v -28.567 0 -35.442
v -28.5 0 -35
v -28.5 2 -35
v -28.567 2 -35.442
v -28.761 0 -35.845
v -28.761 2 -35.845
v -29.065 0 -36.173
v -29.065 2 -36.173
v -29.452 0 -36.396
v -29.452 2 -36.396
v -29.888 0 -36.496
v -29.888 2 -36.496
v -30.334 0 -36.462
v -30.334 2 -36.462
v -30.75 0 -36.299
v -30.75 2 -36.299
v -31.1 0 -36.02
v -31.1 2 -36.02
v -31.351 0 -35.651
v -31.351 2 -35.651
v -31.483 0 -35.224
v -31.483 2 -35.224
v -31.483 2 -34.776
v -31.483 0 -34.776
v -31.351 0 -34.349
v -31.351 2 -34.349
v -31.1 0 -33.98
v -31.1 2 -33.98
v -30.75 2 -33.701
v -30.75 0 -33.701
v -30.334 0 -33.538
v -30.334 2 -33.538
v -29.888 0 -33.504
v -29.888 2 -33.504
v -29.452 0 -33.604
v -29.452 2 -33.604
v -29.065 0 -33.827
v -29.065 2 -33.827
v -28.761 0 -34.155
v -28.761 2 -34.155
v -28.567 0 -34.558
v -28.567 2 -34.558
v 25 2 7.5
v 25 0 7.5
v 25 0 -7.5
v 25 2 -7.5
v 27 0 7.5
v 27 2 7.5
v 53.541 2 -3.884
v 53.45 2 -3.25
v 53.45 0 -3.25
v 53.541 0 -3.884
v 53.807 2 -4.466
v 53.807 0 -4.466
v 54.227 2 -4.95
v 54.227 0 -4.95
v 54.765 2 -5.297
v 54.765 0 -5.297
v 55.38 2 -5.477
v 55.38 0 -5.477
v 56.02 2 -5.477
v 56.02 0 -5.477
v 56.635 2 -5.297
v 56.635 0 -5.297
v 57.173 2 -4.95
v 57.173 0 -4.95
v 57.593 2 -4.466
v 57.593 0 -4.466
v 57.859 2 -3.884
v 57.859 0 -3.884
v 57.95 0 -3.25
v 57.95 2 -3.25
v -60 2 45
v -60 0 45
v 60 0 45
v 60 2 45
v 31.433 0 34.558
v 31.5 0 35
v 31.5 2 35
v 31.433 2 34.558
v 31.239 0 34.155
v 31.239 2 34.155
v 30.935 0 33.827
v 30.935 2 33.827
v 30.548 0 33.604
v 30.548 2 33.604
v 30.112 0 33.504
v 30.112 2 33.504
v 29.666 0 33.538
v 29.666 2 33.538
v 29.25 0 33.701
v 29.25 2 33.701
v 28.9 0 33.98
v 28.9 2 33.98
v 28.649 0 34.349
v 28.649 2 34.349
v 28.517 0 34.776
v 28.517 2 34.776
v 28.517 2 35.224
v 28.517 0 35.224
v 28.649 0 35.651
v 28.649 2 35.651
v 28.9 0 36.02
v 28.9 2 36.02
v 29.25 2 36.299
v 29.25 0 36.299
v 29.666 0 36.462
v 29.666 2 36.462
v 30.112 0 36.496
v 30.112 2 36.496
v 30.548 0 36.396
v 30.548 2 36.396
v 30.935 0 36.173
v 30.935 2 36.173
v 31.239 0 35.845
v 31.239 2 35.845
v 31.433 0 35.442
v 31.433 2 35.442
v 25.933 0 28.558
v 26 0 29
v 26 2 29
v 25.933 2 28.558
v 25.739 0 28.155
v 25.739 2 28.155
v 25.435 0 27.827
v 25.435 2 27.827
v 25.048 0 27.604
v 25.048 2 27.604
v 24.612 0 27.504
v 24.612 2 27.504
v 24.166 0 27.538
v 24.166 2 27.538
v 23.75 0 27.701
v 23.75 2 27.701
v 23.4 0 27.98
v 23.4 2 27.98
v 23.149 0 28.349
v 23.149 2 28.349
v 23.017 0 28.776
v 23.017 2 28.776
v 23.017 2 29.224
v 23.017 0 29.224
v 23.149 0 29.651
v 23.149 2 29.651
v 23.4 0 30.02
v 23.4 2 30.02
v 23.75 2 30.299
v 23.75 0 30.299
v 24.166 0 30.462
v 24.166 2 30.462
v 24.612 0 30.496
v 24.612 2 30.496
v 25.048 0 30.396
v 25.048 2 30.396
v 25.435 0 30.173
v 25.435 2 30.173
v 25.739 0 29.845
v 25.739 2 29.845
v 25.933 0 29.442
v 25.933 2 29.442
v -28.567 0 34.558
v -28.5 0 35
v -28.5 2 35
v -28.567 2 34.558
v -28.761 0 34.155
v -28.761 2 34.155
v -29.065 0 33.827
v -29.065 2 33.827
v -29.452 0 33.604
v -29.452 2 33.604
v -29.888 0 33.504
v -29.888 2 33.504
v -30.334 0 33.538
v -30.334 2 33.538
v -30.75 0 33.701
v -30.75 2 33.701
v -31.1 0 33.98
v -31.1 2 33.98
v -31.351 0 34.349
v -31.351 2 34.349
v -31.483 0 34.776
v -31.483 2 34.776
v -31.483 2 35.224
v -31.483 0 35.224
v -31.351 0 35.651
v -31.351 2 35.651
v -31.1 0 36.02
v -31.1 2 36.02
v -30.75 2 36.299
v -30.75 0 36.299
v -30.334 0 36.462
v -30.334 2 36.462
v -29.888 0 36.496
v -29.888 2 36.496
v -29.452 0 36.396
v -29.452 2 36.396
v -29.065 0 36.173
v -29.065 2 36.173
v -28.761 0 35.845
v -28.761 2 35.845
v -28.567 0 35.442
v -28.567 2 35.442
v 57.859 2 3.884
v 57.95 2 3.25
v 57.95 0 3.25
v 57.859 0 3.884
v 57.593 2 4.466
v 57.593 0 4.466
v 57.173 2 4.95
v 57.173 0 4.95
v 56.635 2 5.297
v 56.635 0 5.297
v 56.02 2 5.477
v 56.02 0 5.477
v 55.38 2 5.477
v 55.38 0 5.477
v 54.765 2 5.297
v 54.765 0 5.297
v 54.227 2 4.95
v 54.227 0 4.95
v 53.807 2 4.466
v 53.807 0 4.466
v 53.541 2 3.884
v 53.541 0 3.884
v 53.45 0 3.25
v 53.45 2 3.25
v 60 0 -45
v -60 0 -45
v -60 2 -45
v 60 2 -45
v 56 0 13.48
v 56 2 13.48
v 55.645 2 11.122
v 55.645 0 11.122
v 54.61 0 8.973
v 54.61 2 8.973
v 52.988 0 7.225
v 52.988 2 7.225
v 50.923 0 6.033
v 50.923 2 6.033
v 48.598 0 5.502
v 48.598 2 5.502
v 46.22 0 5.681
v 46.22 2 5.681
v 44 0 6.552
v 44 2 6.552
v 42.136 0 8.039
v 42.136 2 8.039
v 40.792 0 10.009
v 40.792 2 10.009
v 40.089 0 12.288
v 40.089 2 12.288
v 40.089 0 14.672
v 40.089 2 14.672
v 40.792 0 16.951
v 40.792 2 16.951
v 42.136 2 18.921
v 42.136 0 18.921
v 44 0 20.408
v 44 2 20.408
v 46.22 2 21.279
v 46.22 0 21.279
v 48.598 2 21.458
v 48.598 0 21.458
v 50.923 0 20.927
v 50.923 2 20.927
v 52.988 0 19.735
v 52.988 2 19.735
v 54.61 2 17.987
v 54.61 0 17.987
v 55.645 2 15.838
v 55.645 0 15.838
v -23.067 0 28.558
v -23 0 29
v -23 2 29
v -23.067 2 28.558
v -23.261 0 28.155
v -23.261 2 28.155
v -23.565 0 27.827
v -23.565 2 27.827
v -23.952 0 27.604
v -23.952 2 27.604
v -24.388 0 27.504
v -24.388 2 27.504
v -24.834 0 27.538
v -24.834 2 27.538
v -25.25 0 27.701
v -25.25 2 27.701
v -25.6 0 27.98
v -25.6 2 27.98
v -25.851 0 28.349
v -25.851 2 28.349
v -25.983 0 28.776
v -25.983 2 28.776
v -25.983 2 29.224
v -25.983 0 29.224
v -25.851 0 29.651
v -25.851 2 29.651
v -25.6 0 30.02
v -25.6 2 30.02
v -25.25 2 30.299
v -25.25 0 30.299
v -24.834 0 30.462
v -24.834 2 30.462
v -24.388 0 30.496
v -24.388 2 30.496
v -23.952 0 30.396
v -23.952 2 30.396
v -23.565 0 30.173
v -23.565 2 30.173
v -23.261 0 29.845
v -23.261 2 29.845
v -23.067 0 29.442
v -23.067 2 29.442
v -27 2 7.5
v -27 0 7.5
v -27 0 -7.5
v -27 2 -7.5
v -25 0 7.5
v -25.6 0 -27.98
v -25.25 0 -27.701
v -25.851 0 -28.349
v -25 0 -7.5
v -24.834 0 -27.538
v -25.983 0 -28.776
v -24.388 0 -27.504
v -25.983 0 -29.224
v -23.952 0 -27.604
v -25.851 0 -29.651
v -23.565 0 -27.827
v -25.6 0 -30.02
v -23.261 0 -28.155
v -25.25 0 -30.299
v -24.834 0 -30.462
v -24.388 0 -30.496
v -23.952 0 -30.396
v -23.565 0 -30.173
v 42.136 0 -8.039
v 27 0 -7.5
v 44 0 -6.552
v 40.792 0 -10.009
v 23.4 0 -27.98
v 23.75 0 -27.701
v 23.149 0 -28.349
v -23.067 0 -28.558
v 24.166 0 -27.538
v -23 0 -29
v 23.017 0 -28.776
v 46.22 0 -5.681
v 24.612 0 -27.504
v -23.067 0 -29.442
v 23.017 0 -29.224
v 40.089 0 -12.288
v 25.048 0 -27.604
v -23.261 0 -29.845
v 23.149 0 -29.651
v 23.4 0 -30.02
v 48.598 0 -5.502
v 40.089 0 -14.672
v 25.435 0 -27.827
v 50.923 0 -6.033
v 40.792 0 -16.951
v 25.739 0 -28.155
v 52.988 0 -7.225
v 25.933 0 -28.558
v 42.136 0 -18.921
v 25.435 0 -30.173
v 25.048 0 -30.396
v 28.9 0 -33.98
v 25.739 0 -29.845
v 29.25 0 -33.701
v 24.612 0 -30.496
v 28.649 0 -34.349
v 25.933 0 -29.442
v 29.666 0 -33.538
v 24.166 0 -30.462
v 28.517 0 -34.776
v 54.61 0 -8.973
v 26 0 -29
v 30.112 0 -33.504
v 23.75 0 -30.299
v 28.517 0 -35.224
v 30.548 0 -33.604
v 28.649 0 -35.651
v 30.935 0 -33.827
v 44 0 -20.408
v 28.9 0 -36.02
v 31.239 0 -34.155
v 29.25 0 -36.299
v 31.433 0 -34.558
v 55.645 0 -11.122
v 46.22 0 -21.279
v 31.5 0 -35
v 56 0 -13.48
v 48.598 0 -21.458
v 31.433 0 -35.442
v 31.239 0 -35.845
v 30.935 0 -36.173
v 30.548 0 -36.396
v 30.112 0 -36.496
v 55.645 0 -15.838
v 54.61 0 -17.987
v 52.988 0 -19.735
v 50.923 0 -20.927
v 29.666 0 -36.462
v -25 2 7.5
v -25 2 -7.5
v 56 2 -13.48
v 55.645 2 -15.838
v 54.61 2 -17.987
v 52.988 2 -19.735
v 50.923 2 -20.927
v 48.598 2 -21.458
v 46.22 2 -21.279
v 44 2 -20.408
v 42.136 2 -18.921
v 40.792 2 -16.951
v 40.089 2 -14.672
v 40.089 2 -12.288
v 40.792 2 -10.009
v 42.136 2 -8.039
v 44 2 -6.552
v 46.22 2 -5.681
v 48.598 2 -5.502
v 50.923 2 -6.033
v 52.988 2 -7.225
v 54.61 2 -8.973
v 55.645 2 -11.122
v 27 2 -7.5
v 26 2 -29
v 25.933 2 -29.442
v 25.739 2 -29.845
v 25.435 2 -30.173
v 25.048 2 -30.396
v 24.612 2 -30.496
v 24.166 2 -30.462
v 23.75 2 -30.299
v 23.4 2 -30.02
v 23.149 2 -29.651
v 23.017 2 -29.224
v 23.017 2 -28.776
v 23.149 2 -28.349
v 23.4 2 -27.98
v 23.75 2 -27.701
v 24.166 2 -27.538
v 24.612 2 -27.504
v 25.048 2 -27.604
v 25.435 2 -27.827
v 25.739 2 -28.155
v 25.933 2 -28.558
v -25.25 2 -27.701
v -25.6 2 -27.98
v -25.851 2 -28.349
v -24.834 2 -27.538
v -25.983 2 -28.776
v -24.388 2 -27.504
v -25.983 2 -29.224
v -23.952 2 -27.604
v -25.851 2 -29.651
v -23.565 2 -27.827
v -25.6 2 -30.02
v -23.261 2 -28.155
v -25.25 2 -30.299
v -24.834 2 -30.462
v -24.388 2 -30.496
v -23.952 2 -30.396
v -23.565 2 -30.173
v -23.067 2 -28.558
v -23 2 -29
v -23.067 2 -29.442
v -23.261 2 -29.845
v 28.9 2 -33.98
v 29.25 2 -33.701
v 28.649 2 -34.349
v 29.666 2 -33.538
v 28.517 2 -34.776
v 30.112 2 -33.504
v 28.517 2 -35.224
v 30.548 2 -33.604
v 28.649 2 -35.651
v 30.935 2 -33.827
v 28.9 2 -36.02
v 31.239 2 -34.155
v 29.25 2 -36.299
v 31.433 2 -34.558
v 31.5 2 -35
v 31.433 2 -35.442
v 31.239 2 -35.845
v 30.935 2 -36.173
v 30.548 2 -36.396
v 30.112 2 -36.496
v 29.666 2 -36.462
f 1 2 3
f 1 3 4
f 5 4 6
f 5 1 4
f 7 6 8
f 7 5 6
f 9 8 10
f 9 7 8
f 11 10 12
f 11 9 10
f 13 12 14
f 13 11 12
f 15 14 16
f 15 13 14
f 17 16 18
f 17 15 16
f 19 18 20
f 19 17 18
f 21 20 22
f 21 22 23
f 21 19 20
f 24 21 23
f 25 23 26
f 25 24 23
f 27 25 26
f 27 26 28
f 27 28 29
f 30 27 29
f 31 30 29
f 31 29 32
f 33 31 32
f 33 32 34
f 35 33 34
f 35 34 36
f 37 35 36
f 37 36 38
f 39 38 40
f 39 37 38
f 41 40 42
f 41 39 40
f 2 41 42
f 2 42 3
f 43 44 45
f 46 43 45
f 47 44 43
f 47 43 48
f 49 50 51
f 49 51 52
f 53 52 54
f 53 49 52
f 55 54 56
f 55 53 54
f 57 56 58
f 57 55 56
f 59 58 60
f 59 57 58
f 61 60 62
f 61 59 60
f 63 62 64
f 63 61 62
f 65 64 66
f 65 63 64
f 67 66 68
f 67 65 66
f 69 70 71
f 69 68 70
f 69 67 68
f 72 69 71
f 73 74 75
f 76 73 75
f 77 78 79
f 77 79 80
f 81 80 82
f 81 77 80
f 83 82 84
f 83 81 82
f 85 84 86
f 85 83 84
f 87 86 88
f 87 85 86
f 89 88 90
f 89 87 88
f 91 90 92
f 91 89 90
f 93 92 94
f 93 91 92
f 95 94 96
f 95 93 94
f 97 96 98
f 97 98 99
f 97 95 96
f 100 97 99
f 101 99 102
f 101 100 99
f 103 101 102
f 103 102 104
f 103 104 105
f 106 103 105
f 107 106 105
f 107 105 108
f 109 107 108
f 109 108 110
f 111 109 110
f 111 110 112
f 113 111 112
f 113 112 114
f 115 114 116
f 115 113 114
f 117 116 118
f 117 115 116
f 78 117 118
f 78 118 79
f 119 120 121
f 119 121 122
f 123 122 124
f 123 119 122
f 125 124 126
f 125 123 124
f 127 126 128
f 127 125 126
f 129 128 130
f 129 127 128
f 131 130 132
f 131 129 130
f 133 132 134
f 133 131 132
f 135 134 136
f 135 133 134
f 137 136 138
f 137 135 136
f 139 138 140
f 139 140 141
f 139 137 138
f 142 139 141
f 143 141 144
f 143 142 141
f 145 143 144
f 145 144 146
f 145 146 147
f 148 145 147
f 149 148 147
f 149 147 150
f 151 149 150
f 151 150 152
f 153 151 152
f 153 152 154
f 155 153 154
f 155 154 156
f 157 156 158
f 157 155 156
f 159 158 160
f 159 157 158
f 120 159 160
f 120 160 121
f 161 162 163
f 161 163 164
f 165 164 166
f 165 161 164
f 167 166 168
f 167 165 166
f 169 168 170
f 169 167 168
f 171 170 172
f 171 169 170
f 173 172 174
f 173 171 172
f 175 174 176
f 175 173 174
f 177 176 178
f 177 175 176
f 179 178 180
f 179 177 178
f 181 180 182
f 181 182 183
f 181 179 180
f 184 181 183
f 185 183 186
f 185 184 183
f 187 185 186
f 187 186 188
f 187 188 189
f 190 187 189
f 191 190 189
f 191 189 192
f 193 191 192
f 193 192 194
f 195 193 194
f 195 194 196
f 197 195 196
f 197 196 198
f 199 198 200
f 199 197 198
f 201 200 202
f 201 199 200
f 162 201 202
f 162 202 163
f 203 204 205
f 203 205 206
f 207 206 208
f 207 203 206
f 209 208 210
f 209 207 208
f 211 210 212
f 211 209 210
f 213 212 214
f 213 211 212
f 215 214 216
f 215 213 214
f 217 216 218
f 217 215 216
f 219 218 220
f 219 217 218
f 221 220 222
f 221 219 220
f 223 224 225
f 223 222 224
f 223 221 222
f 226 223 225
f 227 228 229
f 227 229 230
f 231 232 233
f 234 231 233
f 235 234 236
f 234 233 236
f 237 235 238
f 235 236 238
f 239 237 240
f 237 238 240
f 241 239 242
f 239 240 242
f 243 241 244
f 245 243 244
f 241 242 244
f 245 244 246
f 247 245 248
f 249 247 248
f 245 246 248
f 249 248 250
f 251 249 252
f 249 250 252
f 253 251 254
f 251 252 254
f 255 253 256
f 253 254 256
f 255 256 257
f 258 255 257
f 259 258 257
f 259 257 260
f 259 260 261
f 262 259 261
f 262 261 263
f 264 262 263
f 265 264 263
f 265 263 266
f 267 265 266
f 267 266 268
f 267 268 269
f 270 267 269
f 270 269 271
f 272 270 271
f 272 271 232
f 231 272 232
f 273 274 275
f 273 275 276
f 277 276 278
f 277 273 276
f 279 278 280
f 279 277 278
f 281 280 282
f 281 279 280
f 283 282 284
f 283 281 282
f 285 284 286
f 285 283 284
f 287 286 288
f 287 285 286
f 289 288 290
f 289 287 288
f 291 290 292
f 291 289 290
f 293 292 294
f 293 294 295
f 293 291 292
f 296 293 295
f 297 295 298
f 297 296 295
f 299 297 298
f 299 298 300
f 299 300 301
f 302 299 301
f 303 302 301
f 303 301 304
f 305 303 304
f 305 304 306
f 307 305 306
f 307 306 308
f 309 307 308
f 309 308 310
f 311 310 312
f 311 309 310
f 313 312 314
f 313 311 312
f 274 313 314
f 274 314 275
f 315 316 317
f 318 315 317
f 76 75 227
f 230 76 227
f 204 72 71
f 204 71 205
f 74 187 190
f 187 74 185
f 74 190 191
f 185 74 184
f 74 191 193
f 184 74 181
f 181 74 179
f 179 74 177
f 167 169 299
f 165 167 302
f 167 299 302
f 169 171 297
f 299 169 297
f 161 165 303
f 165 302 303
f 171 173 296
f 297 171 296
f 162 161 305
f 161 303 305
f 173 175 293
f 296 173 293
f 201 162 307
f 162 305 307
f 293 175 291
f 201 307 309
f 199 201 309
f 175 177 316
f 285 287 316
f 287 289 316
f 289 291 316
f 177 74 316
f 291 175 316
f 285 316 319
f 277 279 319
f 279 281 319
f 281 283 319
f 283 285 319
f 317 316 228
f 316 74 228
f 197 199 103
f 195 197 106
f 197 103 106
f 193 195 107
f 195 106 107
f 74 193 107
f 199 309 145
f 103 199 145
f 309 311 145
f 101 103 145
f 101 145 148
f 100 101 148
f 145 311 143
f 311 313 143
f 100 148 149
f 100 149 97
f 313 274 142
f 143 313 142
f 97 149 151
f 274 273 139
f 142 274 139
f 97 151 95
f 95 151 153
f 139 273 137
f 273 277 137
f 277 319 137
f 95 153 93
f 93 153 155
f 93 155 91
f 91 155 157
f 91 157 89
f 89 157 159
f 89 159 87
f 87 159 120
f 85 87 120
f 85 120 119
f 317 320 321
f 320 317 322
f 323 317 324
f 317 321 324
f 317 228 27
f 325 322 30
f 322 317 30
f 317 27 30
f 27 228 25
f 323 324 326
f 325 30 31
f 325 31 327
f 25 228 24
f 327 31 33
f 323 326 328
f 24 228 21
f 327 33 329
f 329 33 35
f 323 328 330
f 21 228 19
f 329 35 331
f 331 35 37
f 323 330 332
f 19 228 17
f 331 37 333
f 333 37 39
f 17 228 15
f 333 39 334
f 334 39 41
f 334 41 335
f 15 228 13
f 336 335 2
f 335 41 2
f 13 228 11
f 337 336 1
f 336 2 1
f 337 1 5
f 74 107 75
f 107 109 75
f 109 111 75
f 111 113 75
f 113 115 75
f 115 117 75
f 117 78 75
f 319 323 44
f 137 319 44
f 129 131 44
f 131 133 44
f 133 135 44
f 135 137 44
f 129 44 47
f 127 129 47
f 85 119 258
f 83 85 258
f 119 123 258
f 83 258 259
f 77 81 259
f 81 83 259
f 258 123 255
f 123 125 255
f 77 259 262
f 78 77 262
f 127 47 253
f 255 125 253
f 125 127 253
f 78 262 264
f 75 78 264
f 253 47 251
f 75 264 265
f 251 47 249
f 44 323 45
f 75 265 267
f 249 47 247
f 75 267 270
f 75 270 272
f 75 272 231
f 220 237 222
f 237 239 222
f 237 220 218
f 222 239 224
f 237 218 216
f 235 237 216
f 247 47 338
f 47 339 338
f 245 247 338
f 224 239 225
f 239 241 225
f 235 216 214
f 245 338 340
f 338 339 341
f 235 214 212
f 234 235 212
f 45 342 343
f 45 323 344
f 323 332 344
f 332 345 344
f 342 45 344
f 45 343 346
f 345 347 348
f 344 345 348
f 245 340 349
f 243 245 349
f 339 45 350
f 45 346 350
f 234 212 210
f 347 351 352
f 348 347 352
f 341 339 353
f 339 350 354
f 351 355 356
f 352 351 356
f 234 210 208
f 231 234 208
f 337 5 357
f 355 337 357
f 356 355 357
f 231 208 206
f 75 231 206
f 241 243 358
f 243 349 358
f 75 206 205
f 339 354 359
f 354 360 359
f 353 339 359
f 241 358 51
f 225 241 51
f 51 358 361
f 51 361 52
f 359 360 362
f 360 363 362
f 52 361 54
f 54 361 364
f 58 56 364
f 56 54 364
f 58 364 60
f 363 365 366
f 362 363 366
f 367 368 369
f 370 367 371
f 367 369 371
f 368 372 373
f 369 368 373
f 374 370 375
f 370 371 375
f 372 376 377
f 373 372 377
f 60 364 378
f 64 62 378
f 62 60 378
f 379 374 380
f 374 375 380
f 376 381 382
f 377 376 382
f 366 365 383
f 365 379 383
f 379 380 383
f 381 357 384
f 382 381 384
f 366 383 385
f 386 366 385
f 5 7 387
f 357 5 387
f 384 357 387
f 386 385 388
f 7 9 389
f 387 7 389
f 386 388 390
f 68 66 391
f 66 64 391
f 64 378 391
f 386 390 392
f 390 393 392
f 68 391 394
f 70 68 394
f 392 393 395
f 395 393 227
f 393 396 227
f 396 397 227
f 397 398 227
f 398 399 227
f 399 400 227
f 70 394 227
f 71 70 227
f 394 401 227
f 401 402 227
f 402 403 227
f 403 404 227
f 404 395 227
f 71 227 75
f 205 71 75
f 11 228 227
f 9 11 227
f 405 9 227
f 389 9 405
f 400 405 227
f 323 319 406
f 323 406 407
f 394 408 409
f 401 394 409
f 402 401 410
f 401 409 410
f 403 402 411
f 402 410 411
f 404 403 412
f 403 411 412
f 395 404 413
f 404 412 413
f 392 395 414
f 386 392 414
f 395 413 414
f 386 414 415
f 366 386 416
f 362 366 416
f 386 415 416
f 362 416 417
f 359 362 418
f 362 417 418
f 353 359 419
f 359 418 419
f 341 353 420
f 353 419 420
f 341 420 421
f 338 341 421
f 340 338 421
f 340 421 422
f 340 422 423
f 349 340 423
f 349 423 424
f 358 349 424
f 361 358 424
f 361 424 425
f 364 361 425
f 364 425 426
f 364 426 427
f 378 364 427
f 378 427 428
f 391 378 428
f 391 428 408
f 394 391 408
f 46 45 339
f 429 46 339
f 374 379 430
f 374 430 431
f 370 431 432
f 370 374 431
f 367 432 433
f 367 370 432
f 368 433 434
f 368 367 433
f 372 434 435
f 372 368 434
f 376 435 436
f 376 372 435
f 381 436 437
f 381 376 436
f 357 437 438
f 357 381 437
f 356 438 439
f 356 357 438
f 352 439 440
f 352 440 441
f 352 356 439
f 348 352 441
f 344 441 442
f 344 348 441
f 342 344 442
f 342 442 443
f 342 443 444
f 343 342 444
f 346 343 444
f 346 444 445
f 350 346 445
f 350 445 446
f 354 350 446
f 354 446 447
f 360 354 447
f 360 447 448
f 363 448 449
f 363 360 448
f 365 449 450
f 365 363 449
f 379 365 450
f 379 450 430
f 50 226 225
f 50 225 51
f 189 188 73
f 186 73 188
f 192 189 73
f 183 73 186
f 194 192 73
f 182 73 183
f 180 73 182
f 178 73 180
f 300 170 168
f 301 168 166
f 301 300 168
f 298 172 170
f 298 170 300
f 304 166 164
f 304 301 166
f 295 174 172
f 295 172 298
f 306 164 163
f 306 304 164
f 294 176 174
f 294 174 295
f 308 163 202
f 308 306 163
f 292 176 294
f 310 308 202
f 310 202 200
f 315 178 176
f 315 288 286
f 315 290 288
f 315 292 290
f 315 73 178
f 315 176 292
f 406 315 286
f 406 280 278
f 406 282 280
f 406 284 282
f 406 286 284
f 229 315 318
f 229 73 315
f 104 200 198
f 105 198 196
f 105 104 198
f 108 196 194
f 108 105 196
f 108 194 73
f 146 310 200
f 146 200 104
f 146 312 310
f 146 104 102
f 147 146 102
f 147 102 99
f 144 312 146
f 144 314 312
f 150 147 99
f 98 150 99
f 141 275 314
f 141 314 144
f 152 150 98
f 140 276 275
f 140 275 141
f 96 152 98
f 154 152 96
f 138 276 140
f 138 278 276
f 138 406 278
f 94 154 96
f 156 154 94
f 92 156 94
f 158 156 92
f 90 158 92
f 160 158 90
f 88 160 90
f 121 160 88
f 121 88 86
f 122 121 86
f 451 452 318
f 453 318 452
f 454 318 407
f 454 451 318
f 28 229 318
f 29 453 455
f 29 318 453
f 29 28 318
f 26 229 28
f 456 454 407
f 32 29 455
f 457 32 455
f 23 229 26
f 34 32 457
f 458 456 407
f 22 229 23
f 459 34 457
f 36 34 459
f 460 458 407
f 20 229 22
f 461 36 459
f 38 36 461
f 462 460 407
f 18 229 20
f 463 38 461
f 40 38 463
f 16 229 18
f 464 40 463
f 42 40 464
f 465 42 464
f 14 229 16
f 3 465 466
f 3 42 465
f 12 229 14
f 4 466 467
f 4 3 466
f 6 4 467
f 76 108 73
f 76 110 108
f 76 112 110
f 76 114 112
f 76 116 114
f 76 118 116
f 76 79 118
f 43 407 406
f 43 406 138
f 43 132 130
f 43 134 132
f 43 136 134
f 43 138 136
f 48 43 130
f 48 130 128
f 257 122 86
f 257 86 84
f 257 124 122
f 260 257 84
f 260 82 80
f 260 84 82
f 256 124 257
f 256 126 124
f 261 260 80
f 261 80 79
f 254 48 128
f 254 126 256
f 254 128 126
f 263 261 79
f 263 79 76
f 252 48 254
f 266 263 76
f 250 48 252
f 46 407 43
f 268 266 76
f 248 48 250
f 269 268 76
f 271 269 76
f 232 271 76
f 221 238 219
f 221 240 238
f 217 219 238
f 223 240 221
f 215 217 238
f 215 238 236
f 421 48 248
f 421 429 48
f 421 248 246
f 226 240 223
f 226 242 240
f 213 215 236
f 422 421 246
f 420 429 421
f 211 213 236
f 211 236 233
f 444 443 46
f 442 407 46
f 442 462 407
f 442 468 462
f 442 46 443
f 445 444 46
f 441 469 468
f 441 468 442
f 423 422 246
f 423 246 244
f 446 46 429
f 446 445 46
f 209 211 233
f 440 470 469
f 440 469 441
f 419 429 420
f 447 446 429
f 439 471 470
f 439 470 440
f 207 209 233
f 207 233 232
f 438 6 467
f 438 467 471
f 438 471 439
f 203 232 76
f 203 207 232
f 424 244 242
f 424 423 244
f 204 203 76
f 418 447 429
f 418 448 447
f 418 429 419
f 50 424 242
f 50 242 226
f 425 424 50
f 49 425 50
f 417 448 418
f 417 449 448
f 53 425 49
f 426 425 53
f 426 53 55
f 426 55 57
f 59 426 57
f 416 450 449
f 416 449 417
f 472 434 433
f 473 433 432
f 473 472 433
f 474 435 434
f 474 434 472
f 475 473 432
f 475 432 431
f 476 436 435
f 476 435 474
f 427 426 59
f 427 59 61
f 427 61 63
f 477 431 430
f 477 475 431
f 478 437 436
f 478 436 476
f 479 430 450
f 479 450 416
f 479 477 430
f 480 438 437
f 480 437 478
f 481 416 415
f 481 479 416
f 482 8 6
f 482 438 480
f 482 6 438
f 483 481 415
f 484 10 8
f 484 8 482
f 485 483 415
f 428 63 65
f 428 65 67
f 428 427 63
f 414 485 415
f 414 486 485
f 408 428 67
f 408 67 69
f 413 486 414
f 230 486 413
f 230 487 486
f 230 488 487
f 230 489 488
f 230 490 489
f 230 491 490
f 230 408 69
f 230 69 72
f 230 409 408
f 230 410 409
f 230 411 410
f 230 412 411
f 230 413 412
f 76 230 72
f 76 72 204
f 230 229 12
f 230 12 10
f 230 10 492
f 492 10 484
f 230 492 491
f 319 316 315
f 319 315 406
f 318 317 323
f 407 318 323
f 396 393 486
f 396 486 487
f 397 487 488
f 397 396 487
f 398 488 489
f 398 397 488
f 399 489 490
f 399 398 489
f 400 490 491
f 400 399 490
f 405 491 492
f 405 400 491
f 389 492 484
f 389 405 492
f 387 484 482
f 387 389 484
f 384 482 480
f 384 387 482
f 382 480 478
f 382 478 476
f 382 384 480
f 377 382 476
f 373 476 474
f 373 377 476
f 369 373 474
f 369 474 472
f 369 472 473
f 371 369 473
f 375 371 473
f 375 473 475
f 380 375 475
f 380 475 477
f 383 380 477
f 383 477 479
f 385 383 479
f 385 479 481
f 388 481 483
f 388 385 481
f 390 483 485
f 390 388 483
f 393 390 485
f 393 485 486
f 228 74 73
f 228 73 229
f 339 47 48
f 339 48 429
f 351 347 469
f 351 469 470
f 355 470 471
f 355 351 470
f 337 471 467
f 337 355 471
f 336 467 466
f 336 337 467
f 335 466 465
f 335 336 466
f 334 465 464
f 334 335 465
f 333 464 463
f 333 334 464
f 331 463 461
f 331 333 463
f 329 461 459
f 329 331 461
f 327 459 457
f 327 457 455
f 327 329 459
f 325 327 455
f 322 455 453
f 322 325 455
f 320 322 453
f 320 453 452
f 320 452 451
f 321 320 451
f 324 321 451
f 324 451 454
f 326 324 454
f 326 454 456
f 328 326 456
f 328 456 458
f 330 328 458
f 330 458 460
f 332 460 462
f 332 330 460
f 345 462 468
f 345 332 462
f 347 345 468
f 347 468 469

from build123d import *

# Parameters (mm, degrees)
SKETCH_1_W          = 120
SKETCH_1_H          = 90
SKETCH_1_R          = 1.5
SKETCH_1_W_2        = 2
SKETCH_1_H_2        = 15
EXTRUDE_1_DEPTH     = 2
SKETCH_2_R          = 8
CUT_EXTRUDE_1_DEPTH = 3


with BuildPart() as part:
    # 草圖1 → 填料-伸長1 (new body)
    with BuildSketch(Plane(origin=(0, 0, 0), x_dir=(1, 0, 0), z_dir=(0, 1, 0))):
        Rectangle(SKETCH_1_W, SKETCH_1_H)
        with Locations((-30, 35)):
            Circle(SKETCH_1_R, mode=Mode.SUBTRACT)
        with Locations((30, 35)):
            Circle(SKETCH_1_R, mode=Mode.SUBTRACT)
        with Locations((30, -35)):
            Circle(SKETCH_1_R, mode=Mode.SUBTRACT)
        with Locations((-30, -35)):
            Circle(SKETCH_1_R, mode=Mode.SUBTRACT)
        with Locations((24.5, 29)):
            Circle(SKETCH_1_R, mode=Mode.SUBTRACT)
        with Locations((24.5, -29)):
            Circle(SKETCH_1_R, mode=Mode.SUBTRACT)
        with Locations((-24.5, 29)):
            Circle(SKETCH_1_R, mode=Mode.SUBTRACT)
        with Locations((-24.5, -29)):
            Circle(SKETCH_1_R, mode=Mode.SUBTRACT)
        with Locations((-26, 0)):
            Rectangle(SKETCH_1_W_2, SKETCH_1_H_2, mode=Mode.SUBTRACT)
        with Locations((26, 0)):
            Rectangle(SKETCH_1_W_2, SKETCH_1_H_2, mode=Mode.SUBTRACT)
    extrude(amount=EXTRUDE_1_DEPTH)

    # 草圖2 → 除料-伸長1 (cut, through all)
    with BuildSketch(Plane(origin=(0, 2, 0), x_dir=(1, 0, 0), z_dir=(0, 1, 0))):
        with Locations((48, 13.48)):
            Circle(SKETCH_2_R)
        with Locations((48, -13.48)):
            Circle(SKETCH_2_R)
        with BuildLine():
            Line((53.45, -3.25), (53.45, 3.25))
            ThreePointArc((53.45, 3.25), (55.7, 5.5), (57.95, 3.25))
            Line((57.95, 3.25), (57.95, -3.25))
            ThreePointArc((57.95, -3.25), (55.7, -5.5), (53.45, -3.25))
        make_face()
    extrude(amount=-CUT_EXTRUDE_1_DEPTH, mode=Mode.SUBTRACT)


solid = part.part
